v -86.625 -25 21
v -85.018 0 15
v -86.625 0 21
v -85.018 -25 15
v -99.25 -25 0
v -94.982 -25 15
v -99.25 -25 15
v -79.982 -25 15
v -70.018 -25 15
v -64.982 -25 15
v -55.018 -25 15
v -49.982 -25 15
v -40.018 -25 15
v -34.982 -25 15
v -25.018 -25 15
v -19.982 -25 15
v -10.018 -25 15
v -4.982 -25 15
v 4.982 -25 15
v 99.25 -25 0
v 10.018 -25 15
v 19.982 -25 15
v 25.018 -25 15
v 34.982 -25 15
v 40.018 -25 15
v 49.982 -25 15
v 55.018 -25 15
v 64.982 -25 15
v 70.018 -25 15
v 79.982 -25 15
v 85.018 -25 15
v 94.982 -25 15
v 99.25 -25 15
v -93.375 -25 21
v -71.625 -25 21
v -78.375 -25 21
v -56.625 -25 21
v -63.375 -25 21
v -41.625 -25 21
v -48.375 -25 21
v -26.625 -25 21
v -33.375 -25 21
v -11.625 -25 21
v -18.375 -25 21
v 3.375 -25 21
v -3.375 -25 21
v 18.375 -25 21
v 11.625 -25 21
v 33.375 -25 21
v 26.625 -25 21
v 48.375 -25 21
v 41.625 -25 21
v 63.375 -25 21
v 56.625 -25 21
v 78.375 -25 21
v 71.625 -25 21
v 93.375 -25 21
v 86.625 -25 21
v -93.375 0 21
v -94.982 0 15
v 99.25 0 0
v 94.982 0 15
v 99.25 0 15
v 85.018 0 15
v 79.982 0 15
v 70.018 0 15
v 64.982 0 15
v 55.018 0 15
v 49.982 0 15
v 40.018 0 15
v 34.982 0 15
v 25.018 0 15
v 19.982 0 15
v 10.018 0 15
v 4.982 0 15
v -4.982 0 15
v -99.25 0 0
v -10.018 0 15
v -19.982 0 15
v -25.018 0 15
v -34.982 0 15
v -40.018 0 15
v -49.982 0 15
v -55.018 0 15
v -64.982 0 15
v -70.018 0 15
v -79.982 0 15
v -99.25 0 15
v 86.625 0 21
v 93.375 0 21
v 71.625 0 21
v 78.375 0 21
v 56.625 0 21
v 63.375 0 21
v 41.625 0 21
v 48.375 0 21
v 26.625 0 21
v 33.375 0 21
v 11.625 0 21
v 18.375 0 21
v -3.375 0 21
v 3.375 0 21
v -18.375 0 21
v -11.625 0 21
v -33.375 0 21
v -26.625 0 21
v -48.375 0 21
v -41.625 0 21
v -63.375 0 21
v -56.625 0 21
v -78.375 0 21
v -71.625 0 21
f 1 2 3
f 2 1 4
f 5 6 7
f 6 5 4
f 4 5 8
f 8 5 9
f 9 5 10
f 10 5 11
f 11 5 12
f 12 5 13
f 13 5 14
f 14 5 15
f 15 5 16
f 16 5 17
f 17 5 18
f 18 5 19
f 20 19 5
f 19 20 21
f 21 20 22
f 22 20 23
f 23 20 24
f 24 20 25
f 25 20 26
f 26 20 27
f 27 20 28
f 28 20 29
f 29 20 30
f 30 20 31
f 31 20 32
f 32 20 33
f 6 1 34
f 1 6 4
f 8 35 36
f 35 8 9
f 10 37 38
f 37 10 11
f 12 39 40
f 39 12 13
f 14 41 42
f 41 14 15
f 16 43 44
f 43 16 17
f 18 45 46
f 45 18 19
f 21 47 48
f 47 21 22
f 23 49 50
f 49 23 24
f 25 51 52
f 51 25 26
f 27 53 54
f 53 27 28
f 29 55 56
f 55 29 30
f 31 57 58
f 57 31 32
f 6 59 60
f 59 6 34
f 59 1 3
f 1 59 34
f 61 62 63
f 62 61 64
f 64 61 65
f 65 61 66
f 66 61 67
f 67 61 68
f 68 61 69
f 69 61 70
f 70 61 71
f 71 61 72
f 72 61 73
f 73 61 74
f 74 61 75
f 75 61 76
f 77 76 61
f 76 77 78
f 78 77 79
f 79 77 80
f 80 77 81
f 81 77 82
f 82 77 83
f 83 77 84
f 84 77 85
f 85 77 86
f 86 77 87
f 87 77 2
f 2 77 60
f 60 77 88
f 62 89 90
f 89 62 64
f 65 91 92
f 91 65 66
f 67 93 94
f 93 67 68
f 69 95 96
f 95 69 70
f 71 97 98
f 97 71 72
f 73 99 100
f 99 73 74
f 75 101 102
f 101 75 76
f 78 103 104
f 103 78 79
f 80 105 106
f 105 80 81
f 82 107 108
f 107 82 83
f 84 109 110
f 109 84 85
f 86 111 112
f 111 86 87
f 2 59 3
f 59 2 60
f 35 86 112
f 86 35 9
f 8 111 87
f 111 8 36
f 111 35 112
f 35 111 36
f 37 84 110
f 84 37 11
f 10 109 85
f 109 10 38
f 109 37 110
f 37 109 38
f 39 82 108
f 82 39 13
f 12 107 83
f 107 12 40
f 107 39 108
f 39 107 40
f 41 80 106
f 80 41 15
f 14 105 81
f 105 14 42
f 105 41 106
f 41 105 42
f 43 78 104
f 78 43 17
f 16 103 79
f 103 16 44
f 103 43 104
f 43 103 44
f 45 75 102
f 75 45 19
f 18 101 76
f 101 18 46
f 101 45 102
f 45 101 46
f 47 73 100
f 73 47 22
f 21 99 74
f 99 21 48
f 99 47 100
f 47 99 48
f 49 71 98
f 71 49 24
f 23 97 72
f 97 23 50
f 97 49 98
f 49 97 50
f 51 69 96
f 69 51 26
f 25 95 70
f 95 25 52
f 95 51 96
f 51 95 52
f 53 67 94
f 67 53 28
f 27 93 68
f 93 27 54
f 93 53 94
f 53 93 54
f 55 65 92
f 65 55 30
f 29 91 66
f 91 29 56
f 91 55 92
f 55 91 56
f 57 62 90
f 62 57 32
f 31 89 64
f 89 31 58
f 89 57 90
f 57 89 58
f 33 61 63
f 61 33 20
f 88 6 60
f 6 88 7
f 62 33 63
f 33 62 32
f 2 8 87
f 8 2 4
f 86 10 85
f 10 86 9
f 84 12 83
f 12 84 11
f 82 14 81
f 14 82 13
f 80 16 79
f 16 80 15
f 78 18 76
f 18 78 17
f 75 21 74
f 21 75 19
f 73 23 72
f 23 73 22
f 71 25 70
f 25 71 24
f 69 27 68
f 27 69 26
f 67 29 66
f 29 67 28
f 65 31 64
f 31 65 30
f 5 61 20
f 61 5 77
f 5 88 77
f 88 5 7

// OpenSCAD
$fn = 32;

// ----------------------------------------------------------------------
// Toothed rack, 13 teeth
// 15 mm pitch, 6 mm teeth
// ----------------------------------------------------------------------

// --- parameters (mm) ---
bar_w = 25;      // bar width (Y)
bar_h = 15;      // bar height (Z)
teeth = 13;      // number of teeth
pitch = 15;      // tooth pitch
tooth_h = 6;     // tooth height above the bar
root_w = 10.5;   // tooth width at the root
crest_w = 6.75;  // tooth width at the crest

// --- derived feature positions (mm) ---
span = (teeth - 1) * pitch;  // = 180   distance between the outer teeth
bar_l = span + root_w + 8;   // = 198.5   bar length: teeth plus 4 mm at each end
tooth_x = -span / 2;         // = -90   X of the first tooth
height = bar_h + tooth_h;    // = 21   overall height
feature_centers = [
  [tooth_x + 0 * pitch, -bar_w / 2],
  [tooth_x + 1 * pitch, -bar_w / 2],
  [tooth_x + 2 * pitch, -bar_w / 2],
  [tooth_x + 3 * pitch, -bar_w / 2],
  [tooth_x + 4 * pitch, -bar_w / 2],
  [tooth_x + 5 * pitch, -bar_w / 2],
  [tooth_x + 6 * pitch, -bar_w / 2],
  [tooth_x + 7 * pitch, -bar_w / 2],
  [tooth_x + 8 * pitch, -bar_w / 2],
  [tooth_x + 9 * pitch, -bar_w / 2],
  [tooth_x + 10 * pitch, -bar_w / 2],
  [tooth_x + 11 * pitch, -bar_w / 2],
  [tooth_x + 12 * pitch, -bar_w / 2]
];   // tooth centre line, drives the tooth loop

// bar with a rack of teeth, one extruded trapezoium per centre
module rack_tooth() {
  linear_extrude(height = bar_w)
    polygon(points = [
      [0, 0],
      [root_w, 0],
      [root_w / 2 + crest_w / 2, tooth_h + 1],
      [root_w / 2 - crest_w / 2, tooth_h + 1]
    ]);
}

union() {
  translate([-bar_l / 2, -bar_w, 0]) cube([bar_l, bar_w, bar_h]);
  for (centre = feature_centers)
    translate([centre[0] - root_w / 2, 0, bar_h - 1]) rotate([90, 0, 0]) rack_tooth();
}
